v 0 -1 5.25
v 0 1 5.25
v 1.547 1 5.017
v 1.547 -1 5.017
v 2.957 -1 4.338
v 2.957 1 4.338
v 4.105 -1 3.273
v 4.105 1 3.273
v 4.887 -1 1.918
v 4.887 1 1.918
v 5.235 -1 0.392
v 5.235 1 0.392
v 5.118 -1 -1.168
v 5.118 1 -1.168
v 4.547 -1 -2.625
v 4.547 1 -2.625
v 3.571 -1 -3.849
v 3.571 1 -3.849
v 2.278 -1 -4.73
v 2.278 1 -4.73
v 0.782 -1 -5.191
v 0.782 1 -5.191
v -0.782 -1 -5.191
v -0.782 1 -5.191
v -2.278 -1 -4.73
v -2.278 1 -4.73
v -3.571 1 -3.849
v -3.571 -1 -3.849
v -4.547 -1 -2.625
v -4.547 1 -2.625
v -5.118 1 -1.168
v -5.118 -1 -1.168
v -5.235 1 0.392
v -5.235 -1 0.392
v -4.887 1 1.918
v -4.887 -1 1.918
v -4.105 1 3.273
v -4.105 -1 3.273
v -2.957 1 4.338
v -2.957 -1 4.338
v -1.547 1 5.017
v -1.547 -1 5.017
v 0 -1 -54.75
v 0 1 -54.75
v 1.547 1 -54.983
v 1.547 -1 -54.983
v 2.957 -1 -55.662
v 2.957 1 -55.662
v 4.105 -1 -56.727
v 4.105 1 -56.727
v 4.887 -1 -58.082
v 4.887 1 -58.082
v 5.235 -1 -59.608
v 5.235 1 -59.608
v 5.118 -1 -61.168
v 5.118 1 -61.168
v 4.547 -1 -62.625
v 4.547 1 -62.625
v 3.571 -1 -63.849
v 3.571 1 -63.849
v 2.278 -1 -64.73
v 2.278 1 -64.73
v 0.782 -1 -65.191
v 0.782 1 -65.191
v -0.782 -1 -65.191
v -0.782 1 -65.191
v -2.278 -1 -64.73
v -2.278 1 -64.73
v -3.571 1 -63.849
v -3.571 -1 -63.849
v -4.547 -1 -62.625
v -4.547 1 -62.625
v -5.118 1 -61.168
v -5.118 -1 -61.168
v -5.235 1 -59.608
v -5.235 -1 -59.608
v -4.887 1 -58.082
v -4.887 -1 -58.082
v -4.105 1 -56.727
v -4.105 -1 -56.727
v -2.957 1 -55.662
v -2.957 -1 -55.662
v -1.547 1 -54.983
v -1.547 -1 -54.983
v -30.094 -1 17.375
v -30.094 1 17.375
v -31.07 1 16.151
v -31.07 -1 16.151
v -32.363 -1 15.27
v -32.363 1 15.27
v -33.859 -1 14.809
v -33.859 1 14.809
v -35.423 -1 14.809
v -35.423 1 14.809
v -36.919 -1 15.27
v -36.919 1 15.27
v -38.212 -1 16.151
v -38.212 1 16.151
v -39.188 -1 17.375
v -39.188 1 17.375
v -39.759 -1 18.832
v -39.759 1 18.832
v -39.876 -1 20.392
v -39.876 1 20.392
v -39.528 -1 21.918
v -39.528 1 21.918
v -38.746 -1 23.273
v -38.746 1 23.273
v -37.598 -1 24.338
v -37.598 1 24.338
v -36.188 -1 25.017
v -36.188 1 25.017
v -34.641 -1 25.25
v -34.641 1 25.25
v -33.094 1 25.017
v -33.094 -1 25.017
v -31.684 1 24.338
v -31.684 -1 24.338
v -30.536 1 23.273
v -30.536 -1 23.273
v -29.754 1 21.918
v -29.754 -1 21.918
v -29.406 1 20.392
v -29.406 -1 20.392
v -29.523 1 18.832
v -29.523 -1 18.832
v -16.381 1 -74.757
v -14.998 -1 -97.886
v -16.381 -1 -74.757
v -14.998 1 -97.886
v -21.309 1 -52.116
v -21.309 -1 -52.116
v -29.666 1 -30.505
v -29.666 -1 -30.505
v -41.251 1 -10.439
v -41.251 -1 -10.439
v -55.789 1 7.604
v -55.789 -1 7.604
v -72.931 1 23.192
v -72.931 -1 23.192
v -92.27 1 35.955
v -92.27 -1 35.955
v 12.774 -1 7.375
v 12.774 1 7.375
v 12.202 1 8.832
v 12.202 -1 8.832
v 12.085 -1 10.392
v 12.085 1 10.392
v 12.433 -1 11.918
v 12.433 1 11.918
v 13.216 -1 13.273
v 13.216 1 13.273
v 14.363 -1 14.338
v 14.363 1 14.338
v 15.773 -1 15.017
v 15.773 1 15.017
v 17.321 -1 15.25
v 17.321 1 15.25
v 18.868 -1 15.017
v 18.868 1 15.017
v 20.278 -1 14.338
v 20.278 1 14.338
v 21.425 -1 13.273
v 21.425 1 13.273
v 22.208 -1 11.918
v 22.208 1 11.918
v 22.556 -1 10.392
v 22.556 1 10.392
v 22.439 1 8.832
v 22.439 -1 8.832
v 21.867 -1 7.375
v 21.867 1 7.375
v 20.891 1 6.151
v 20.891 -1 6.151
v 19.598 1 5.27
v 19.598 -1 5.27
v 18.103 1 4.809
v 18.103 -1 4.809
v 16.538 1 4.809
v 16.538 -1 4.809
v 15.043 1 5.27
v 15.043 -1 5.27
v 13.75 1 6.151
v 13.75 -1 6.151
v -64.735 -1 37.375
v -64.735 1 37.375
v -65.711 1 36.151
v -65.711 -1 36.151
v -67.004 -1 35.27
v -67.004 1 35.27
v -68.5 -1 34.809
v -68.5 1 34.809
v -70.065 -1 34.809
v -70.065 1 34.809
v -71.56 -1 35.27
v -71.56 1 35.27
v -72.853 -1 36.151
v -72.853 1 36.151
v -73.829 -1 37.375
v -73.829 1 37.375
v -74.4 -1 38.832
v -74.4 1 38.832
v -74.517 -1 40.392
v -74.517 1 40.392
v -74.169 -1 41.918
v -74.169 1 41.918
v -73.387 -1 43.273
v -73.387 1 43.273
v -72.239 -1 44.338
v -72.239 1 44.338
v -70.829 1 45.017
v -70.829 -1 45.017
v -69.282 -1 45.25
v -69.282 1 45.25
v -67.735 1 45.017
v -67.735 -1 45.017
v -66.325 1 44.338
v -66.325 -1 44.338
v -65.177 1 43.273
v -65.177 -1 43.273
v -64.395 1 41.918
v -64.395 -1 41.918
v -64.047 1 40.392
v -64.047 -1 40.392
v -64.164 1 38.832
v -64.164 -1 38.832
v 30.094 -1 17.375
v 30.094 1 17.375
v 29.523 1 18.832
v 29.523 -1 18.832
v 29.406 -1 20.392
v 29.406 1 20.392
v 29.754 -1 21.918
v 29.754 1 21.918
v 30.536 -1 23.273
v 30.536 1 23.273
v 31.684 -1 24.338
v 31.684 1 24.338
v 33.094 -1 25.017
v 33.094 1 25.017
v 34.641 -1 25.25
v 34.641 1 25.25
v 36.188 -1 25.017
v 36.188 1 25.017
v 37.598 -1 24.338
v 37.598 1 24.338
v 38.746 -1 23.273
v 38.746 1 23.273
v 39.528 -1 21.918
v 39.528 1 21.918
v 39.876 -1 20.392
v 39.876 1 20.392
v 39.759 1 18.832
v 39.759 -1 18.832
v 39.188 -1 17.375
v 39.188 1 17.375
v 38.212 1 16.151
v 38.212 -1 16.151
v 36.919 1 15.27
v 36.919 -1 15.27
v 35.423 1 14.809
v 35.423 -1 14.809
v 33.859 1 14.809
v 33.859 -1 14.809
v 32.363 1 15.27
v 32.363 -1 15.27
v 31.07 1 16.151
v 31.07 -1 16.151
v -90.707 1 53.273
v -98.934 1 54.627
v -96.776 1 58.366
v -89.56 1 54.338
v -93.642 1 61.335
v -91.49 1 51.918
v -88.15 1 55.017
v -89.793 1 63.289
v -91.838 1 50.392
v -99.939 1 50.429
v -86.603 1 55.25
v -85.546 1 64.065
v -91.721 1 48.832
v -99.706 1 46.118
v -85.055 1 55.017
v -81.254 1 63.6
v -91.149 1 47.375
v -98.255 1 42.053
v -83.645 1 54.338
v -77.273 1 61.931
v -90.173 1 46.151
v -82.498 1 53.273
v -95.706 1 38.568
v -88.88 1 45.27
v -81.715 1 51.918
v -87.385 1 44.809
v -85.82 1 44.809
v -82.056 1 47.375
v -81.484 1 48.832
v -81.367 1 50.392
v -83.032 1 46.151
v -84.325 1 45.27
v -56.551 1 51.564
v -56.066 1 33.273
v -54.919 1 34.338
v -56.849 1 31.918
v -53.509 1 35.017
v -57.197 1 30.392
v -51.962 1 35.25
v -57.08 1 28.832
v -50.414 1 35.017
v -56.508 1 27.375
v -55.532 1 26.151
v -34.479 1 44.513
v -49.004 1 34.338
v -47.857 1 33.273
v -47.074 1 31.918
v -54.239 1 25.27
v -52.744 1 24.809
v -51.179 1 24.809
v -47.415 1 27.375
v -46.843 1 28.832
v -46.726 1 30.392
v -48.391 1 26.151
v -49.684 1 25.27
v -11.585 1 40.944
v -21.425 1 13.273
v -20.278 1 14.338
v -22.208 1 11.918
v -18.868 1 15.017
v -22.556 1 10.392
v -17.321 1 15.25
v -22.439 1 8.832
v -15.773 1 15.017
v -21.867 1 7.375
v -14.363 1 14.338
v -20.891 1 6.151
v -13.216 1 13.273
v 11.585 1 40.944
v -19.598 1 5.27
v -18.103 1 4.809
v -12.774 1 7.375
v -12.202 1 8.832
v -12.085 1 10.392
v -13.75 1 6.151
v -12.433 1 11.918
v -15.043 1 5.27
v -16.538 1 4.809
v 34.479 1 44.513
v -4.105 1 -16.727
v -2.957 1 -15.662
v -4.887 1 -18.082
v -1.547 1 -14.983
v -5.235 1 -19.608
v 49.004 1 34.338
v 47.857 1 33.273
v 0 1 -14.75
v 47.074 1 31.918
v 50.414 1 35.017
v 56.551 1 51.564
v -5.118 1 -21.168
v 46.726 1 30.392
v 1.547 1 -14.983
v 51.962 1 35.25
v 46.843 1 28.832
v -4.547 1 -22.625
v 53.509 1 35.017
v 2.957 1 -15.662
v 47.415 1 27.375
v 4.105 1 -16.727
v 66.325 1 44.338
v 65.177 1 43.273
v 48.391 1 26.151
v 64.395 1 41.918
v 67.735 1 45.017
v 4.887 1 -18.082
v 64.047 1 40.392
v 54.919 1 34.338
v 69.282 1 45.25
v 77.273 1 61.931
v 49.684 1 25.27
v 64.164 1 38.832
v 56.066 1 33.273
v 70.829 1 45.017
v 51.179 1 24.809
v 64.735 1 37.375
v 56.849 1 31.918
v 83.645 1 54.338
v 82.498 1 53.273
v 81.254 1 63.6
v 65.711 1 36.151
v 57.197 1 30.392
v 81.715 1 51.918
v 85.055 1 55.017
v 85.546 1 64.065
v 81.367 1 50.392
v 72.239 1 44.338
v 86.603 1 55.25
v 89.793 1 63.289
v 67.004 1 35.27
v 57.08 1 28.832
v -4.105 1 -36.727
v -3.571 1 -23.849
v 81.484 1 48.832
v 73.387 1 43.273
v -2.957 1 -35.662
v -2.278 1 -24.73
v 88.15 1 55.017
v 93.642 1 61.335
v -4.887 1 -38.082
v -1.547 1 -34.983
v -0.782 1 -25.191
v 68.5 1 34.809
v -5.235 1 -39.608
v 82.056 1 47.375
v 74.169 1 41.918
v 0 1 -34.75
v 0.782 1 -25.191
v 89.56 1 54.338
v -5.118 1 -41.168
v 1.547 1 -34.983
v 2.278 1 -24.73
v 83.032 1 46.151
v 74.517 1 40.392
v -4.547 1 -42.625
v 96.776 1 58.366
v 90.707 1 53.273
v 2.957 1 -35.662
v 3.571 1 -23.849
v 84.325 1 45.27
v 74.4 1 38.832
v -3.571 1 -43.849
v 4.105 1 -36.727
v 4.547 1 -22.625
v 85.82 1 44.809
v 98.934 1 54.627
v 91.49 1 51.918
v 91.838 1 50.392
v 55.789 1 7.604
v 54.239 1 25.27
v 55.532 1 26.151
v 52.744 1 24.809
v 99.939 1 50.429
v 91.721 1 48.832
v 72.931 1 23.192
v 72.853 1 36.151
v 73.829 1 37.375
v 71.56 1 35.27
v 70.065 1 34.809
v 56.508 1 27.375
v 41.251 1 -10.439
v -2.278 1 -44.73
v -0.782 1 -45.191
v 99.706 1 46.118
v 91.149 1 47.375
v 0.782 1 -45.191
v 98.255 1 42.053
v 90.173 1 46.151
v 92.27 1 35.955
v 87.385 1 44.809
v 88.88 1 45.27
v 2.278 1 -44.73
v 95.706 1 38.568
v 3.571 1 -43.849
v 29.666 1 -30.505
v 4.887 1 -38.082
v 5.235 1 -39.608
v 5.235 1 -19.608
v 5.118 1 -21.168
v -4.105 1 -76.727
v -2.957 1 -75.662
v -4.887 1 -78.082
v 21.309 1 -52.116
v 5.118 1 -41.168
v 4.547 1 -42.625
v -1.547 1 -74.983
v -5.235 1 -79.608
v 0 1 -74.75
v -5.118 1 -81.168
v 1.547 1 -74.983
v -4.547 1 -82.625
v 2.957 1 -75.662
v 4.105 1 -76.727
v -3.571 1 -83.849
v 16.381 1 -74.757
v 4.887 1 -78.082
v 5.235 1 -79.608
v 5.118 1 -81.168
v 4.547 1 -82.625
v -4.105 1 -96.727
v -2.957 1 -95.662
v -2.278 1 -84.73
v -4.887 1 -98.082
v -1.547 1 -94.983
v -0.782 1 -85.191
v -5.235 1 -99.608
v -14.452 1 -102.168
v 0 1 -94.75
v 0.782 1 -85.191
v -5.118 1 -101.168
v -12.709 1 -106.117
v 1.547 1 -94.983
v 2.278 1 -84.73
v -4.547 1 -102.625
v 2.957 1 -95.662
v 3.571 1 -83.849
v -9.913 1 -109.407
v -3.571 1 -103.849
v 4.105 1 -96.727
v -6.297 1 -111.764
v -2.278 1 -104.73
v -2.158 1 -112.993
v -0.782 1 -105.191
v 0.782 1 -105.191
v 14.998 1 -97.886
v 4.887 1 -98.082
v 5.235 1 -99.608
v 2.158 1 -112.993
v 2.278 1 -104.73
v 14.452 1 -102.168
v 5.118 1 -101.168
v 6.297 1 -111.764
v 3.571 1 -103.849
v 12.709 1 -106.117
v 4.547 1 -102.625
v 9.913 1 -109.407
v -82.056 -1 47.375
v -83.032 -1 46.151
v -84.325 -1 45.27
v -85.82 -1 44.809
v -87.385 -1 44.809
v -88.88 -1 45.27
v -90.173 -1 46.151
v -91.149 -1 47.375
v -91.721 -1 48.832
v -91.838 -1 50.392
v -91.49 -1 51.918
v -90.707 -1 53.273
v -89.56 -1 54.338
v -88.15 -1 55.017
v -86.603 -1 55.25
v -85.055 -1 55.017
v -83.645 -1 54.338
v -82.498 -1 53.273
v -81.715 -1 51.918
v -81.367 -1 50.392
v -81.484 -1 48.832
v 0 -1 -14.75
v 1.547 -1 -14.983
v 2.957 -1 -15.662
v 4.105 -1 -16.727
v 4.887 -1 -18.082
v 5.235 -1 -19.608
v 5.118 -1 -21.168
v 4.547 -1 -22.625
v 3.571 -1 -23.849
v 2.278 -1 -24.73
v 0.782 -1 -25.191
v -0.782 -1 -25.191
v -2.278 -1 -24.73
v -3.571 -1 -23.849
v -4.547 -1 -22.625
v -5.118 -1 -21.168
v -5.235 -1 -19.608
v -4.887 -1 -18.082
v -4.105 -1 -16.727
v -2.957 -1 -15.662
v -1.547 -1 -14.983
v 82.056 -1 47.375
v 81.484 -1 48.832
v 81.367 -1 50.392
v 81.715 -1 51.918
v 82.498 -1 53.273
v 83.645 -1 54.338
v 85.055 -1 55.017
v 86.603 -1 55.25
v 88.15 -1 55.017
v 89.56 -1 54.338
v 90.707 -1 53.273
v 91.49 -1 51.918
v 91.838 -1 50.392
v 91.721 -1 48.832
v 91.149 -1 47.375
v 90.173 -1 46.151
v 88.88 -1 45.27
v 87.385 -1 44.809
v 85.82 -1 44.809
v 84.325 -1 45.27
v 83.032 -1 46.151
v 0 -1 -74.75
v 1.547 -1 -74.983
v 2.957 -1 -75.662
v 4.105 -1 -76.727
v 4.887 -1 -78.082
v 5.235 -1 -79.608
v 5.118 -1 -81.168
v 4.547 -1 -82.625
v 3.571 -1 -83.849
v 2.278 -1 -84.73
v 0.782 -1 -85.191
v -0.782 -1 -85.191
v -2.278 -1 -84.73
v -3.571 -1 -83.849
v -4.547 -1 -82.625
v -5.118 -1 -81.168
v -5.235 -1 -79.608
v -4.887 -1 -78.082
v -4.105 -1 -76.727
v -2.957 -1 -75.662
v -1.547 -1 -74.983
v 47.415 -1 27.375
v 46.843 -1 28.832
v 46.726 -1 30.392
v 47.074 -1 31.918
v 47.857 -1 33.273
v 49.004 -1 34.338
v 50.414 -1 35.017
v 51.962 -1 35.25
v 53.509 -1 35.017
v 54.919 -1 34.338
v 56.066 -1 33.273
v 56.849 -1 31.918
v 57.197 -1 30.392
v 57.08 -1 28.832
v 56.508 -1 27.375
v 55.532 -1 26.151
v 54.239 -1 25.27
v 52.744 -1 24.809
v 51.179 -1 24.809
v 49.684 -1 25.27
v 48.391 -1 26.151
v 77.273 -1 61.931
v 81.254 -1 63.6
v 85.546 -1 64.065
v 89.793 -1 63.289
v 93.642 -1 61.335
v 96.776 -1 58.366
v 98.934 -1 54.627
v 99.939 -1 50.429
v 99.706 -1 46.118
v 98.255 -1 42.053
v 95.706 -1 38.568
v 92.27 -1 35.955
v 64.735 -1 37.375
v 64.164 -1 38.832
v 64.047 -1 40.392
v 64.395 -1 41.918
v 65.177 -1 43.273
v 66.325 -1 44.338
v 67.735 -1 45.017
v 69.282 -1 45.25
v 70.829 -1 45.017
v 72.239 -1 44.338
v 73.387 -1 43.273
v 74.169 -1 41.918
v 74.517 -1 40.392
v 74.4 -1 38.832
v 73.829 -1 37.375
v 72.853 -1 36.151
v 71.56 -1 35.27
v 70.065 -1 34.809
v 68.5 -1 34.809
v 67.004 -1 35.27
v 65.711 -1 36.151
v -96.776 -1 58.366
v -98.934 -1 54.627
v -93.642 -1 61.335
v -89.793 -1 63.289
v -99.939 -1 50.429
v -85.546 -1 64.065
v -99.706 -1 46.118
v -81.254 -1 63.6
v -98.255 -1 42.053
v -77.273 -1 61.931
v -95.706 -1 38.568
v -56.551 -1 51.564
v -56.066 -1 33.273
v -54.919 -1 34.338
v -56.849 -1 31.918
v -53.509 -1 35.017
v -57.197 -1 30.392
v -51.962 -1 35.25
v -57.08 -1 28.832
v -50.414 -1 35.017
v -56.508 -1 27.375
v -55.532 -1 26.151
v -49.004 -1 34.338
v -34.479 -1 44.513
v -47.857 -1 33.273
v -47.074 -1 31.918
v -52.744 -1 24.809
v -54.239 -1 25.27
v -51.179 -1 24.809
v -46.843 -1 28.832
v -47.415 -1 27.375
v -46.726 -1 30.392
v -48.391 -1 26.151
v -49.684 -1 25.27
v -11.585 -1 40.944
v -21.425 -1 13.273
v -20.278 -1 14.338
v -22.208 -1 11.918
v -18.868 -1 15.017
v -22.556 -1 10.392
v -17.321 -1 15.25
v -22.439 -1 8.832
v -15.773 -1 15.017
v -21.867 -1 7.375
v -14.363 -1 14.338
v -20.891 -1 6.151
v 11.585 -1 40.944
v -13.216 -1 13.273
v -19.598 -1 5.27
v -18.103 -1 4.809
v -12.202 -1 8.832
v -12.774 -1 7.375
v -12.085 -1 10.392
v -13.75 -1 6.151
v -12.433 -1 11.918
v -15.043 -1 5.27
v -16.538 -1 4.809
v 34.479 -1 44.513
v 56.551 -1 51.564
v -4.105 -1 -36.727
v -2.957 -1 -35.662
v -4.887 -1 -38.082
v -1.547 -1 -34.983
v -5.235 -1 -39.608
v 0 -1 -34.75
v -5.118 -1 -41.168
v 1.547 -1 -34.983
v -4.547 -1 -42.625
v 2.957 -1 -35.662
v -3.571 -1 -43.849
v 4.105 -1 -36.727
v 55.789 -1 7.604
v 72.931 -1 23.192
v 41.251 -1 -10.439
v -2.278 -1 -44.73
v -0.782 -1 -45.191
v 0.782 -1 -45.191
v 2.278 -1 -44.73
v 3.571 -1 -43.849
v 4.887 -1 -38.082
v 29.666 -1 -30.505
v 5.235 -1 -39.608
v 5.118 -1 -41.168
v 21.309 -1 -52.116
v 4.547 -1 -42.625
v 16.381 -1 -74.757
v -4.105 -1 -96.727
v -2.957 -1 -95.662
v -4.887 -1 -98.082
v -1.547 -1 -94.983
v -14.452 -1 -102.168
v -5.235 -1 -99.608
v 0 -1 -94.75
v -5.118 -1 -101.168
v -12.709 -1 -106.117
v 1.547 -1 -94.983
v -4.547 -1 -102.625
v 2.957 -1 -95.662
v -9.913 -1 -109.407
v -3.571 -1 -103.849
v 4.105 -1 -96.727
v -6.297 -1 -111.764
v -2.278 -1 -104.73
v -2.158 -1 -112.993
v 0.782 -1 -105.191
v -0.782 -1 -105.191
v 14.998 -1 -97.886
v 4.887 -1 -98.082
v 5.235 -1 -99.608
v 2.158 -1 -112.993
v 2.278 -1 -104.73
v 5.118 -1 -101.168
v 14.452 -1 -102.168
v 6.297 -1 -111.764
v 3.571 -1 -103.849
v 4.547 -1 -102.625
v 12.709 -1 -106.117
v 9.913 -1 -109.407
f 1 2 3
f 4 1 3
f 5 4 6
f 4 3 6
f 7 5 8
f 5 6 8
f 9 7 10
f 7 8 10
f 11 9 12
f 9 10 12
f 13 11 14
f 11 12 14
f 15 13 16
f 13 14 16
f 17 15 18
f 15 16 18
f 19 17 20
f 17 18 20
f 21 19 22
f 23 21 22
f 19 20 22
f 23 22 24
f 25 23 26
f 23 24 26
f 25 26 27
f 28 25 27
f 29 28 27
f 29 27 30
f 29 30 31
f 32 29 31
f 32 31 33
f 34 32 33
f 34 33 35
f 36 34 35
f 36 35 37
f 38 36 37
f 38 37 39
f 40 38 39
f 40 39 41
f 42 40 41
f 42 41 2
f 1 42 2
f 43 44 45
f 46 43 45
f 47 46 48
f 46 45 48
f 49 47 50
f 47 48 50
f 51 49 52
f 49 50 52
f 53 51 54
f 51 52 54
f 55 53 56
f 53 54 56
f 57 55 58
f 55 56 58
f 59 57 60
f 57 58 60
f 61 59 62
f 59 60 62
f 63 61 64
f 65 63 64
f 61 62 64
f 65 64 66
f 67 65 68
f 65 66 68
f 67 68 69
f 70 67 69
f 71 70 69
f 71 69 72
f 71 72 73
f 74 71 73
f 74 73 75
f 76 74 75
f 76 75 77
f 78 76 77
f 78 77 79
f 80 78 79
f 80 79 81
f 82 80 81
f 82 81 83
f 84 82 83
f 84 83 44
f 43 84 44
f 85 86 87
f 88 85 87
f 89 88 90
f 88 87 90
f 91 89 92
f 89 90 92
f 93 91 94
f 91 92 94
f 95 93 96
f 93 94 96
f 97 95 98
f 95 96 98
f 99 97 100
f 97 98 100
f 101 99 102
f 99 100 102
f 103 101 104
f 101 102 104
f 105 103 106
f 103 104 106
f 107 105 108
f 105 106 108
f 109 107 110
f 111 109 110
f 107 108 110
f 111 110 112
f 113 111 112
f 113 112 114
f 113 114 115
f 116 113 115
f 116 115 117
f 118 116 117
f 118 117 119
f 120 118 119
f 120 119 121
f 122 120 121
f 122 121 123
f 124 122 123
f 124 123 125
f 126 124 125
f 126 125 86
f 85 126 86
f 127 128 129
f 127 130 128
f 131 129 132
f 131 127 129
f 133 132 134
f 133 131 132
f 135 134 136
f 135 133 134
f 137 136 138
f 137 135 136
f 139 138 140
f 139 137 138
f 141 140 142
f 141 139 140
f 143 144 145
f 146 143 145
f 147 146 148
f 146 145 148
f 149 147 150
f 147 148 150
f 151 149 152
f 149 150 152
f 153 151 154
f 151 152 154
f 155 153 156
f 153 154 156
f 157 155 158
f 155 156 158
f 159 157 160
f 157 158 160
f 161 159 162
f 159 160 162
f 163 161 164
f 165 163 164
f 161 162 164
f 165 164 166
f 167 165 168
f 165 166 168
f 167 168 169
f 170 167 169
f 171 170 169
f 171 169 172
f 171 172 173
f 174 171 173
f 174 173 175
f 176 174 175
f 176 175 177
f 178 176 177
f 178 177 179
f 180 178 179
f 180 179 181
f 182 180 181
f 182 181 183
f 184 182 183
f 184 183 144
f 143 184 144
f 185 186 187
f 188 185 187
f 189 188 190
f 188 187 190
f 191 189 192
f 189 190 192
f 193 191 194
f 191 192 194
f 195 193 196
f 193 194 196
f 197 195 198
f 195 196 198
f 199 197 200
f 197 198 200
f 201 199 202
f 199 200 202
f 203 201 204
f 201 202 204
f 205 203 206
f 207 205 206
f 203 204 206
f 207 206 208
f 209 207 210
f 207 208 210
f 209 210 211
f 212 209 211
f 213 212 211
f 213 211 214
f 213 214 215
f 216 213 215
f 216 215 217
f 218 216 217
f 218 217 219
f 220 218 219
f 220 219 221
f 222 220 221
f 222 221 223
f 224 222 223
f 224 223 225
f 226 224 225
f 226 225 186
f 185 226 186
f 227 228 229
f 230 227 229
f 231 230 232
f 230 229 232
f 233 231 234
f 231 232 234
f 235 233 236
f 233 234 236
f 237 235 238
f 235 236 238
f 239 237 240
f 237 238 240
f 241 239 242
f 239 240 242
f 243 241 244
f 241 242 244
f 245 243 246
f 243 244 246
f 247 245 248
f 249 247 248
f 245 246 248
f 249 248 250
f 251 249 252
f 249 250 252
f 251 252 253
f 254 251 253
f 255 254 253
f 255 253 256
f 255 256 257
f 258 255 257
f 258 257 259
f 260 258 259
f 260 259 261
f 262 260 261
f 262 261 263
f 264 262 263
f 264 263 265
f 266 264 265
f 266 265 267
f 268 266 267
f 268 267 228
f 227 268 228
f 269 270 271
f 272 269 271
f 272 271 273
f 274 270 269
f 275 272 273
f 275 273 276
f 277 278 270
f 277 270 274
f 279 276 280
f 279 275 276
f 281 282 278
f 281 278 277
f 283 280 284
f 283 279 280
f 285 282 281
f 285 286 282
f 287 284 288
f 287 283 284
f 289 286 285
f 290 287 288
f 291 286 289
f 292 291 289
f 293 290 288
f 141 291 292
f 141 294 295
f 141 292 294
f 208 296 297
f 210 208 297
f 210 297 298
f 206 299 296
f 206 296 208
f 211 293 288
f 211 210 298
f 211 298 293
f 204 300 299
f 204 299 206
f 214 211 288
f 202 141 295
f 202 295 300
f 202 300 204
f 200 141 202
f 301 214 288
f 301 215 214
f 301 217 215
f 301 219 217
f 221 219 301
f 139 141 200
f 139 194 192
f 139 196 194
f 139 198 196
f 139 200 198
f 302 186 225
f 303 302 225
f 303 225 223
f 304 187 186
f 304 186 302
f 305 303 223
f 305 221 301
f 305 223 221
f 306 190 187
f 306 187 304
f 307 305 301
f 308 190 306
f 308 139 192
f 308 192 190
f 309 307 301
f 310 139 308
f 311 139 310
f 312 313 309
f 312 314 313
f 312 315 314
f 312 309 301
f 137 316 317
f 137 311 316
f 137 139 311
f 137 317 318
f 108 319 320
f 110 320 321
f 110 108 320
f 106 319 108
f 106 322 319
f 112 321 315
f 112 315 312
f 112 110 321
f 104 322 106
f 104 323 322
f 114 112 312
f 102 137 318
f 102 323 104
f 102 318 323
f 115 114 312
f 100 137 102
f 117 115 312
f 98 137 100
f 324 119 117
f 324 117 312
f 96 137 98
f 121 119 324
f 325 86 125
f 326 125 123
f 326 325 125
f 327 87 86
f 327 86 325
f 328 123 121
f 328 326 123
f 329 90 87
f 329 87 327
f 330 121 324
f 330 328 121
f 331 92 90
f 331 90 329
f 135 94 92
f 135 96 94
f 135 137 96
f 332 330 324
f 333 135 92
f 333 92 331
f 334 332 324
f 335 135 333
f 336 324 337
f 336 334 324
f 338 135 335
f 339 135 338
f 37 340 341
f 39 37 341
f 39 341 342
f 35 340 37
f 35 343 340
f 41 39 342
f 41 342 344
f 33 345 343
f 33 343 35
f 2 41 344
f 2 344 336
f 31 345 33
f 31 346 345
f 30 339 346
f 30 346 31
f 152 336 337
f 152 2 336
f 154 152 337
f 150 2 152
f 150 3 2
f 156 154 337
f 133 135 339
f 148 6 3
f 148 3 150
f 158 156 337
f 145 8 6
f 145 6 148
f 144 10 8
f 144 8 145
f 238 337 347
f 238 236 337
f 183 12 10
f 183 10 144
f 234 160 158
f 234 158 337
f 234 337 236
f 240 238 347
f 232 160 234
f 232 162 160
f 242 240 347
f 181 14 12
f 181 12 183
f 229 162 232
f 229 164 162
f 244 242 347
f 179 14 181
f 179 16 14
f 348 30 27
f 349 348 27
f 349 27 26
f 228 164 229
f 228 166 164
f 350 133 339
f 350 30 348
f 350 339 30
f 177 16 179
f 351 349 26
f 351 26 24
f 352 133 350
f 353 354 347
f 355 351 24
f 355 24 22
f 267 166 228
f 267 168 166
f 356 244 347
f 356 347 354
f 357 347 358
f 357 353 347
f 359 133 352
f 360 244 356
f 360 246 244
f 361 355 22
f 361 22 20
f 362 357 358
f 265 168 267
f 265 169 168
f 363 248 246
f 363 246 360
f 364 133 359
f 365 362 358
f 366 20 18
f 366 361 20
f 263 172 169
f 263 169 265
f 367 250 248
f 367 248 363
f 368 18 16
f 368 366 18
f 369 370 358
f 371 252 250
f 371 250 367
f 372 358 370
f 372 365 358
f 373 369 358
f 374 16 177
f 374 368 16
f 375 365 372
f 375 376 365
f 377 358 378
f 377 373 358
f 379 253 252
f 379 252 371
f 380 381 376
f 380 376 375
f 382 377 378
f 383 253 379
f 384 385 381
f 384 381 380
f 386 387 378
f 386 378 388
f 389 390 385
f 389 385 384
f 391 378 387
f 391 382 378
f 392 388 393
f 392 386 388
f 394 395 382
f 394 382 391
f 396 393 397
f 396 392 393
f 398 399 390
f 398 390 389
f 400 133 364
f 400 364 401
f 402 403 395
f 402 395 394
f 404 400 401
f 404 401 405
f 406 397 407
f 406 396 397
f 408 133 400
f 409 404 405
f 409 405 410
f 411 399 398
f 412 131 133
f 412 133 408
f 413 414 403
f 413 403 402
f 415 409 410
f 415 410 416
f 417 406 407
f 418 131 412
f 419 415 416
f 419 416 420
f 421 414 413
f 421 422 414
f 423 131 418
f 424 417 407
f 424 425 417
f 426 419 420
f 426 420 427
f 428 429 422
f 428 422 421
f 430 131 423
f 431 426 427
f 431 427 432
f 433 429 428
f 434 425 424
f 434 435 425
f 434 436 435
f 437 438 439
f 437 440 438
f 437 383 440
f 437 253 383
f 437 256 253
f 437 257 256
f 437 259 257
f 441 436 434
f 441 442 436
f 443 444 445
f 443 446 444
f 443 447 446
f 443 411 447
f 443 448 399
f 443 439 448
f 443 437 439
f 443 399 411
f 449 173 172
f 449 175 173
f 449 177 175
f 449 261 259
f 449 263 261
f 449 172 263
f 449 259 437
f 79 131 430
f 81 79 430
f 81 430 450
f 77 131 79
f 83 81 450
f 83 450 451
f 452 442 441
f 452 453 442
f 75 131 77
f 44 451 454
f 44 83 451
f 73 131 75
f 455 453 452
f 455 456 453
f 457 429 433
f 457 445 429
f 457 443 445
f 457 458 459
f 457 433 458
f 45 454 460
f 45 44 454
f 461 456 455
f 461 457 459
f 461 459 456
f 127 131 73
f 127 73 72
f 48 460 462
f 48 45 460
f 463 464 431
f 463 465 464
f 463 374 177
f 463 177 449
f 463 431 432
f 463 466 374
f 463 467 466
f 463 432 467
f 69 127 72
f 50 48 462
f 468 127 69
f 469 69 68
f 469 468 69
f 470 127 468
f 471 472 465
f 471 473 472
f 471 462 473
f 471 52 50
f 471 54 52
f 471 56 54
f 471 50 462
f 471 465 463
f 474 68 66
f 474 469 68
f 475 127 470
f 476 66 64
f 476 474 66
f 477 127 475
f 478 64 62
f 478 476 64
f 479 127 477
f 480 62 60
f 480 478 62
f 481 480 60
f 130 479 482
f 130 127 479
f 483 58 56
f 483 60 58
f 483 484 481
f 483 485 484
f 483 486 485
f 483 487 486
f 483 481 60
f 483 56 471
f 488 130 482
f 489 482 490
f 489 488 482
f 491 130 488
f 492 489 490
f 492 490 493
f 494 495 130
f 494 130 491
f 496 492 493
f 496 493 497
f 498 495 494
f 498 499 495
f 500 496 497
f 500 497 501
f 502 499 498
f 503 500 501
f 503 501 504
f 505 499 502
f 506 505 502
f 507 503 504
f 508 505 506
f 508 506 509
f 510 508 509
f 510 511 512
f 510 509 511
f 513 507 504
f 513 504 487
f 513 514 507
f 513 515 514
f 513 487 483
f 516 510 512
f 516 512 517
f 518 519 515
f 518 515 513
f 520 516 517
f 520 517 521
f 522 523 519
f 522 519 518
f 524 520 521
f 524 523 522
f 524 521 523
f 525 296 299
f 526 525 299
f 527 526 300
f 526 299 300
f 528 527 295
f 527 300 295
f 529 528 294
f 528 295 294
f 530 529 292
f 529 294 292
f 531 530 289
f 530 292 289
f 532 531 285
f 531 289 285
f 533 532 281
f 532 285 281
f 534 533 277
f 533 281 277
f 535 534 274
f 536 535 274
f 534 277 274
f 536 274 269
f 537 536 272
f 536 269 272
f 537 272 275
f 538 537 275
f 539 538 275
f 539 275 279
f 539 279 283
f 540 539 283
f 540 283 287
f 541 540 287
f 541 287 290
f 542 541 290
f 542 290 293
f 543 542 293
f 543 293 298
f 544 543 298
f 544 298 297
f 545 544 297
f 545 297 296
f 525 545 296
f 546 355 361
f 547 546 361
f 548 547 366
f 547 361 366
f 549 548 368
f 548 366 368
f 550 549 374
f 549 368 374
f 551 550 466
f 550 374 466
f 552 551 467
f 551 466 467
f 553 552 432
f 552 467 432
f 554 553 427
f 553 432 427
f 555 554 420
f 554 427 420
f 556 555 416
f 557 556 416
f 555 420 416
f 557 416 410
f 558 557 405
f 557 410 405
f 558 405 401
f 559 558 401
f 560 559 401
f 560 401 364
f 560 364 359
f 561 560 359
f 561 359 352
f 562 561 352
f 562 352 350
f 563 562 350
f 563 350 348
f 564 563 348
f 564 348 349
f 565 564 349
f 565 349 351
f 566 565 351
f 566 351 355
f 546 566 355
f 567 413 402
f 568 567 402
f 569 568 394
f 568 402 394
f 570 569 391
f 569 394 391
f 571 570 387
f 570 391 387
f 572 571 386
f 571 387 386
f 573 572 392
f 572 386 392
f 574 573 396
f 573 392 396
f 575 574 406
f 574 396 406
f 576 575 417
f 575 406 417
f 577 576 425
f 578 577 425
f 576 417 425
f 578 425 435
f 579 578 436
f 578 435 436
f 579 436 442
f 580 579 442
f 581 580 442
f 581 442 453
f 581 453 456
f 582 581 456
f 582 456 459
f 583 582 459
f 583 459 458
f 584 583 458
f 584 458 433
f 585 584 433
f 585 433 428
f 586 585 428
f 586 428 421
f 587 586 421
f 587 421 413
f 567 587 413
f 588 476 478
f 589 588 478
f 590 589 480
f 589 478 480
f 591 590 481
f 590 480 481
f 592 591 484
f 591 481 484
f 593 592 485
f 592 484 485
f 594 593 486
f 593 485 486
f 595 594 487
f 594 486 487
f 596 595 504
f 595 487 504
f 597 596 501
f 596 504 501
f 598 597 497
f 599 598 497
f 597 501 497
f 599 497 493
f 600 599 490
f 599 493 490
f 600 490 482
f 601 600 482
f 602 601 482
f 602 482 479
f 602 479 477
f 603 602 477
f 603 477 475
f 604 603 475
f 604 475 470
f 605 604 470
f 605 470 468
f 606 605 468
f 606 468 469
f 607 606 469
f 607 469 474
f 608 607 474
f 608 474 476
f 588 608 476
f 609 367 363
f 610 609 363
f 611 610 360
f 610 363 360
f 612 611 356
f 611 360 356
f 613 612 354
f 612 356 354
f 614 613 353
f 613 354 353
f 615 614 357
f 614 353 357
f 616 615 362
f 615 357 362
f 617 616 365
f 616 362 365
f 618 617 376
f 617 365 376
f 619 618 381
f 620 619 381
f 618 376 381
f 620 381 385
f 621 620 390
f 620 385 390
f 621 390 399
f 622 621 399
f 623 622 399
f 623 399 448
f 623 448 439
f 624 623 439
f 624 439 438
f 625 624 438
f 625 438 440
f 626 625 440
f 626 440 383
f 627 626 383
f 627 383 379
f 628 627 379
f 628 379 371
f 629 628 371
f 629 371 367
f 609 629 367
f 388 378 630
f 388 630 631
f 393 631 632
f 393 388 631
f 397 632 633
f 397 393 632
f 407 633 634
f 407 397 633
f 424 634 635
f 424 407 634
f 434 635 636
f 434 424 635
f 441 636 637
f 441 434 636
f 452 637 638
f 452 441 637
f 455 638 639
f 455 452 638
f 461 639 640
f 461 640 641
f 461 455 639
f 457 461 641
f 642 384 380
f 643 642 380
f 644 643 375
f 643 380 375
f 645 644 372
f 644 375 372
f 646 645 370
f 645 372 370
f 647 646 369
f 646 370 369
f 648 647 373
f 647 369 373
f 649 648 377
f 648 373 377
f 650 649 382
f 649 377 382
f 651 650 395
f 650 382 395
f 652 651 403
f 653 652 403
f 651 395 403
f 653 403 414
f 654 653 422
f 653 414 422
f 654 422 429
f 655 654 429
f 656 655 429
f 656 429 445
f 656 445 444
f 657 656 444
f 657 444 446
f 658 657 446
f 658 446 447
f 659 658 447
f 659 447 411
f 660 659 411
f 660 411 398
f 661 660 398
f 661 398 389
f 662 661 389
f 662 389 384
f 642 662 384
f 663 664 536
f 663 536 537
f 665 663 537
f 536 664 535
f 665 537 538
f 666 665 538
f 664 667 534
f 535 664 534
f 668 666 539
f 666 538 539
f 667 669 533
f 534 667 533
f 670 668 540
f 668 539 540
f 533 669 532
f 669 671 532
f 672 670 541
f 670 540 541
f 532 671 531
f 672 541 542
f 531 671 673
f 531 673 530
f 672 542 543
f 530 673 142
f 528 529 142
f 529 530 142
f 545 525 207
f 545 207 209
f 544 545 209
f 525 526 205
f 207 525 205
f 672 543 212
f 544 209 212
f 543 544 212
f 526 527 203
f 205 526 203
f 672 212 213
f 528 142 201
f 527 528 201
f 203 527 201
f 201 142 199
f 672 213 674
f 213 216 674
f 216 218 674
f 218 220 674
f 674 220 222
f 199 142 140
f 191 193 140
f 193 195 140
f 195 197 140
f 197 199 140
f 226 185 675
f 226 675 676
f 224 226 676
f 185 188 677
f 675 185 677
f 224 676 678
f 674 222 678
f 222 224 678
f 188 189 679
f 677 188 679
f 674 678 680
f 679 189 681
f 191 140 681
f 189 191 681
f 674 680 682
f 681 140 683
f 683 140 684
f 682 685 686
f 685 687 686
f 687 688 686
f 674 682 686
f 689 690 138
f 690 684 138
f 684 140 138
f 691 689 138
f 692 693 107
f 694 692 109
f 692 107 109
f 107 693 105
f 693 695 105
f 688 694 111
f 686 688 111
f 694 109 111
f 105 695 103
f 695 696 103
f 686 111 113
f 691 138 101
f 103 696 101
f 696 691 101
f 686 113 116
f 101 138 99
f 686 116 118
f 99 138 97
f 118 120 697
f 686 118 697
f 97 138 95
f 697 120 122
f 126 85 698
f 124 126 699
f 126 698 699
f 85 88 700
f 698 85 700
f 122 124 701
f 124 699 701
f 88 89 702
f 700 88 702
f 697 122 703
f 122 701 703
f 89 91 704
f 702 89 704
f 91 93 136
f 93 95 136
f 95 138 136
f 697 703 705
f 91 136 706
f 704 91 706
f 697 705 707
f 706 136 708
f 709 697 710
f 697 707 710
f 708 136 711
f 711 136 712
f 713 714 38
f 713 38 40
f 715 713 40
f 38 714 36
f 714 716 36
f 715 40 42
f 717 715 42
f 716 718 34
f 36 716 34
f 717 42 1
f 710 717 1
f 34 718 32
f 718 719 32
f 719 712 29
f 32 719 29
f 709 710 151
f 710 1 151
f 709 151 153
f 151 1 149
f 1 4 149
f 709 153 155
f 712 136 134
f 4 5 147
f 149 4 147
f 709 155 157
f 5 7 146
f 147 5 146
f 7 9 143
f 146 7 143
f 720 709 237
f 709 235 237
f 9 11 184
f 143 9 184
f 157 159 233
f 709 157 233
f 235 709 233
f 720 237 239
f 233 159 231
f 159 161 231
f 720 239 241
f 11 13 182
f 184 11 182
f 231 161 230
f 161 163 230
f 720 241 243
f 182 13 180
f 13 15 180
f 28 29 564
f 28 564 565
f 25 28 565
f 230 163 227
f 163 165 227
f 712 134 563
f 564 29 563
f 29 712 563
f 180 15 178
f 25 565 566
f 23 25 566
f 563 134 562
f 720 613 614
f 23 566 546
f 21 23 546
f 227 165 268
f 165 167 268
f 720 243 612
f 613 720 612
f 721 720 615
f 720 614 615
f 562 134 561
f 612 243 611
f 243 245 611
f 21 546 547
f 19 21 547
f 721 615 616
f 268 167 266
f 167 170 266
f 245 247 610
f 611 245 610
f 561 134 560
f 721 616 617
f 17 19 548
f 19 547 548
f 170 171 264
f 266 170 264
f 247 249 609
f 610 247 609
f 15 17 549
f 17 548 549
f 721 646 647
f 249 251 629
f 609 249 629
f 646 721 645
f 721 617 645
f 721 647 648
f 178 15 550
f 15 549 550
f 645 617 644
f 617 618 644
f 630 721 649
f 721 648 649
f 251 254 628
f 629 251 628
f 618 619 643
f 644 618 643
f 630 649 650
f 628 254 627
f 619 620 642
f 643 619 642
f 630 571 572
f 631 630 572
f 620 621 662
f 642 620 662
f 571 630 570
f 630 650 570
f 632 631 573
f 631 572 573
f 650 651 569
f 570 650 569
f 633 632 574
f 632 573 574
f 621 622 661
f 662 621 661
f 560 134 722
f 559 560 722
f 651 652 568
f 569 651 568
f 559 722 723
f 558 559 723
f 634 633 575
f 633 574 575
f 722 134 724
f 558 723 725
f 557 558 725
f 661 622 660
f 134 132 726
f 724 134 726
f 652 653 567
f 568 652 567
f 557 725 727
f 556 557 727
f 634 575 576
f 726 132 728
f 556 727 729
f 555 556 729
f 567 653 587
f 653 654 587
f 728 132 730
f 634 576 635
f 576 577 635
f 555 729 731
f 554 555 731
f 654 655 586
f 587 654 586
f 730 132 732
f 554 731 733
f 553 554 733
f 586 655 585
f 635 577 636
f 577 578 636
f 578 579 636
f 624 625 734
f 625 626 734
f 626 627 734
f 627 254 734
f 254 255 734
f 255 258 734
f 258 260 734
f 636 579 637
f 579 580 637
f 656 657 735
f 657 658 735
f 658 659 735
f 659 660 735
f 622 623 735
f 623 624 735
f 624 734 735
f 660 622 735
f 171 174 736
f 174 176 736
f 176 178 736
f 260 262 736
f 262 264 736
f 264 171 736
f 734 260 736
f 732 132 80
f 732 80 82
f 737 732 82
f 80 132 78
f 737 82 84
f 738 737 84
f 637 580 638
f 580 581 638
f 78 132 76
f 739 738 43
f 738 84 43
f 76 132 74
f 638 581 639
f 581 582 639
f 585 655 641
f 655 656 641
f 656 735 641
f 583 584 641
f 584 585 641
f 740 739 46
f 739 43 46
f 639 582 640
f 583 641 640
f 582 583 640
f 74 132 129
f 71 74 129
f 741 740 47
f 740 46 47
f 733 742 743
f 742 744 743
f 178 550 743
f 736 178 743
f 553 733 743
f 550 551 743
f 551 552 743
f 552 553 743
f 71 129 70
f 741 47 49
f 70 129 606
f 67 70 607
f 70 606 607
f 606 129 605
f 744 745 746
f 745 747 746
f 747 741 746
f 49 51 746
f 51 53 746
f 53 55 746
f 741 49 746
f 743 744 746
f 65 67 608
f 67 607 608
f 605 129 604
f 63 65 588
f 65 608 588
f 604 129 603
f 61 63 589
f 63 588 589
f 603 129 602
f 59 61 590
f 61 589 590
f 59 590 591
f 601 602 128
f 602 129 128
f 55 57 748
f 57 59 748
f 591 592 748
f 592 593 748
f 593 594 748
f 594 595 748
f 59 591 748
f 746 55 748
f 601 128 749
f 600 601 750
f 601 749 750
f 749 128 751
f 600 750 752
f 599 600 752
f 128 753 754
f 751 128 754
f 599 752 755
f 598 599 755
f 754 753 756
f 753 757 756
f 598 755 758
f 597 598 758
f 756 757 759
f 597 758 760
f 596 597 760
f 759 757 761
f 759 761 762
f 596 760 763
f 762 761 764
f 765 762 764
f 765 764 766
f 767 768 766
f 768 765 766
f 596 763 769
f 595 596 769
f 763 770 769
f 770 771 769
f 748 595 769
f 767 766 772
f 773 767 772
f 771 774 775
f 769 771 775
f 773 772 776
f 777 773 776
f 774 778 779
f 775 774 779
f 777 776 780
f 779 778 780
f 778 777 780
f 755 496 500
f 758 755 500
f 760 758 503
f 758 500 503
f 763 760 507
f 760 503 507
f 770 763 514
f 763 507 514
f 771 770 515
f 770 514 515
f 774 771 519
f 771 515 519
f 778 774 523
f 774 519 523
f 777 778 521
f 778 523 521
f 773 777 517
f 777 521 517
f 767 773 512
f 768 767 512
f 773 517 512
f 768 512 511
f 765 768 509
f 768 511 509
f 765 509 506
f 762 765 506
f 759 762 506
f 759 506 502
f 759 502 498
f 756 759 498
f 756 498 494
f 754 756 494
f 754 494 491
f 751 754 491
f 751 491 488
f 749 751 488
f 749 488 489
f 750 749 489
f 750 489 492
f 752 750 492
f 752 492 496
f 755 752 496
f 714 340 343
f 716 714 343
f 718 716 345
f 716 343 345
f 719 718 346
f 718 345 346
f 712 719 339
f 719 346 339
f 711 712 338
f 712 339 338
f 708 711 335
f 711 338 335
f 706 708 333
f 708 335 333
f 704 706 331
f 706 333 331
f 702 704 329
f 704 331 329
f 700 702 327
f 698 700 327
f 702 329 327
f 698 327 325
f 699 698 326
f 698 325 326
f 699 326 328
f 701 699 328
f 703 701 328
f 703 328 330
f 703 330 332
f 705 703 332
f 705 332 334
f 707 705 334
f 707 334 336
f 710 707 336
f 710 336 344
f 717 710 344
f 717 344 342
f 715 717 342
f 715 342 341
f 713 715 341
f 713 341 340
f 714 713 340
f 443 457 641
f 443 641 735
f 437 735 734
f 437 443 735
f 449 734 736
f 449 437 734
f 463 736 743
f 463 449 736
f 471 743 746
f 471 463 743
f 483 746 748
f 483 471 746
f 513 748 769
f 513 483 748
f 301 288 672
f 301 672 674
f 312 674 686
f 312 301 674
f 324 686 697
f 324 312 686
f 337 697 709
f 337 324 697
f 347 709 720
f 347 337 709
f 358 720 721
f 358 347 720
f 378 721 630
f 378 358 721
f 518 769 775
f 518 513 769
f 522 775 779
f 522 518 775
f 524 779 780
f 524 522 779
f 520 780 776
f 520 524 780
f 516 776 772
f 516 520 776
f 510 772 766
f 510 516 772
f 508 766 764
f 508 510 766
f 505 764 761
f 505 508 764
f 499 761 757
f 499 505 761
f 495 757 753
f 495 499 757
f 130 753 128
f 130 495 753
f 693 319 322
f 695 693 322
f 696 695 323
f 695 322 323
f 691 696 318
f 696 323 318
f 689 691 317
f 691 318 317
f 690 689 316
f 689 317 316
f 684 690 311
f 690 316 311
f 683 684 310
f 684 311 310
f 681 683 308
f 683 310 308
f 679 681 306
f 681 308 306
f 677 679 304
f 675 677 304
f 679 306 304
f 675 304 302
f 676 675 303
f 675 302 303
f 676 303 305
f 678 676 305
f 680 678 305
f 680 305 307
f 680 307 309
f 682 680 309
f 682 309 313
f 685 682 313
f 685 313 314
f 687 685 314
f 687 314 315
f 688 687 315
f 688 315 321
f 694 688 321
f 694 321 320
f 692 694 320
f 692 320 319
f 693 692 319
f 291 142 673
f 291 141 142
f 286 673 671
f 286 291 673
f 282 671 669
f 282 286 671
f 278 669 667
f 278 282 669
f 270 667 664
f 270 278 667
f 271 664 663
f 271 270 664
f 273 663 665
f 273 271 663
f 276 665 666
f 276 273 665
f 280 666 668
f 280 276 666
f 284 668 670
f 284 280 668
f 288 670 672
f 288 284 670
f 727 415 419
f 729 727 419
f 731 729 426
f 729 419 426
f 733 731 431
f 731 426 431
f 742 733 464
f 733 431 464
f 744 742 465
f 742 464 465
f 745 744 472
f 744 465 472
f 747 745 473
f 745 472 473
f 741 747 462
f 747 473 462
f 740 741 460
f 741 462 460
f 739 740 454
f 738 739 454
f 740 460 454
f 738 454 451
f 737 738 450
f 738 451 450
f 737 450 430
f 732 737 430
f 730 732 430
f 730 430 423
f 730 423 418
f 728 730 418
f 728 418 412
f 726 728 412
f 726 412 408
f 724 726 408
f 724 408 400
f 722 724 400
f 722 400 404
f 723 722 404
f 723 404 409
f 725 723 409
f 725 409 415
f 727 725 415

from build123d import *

# Parameters (mm, degrees)
BOSS_EXTRUDE1_DEPTH          = 1
CUT_EXTRUDE1_REACH           = 153.019
SKETCH2_R                    = 5.25
LPATTERN1_COUNT              = 6
LPATTERN1_PITCH              = 20
CIRPATTERN1_COPY_1_REACH     = 153.019
CIRPATTERN1_COPY_1_SKETCH_R  = 5.25
CIRPATTERN1_COPY_2_REACH     = 153.019
CIRPATTERN1_COPY_2_SKETCH_R  = 5.25
CIRPATTERN1_COPY_3_REACH     = 153.019
CIRPATTERN1_COPY_3_SKETCH_R  = 5.25
CIRPATTERN1_COPY_4_REACH     = 153.019
CIRPATTERN1_COPY_4_SKETCH_R  = 5.25
CIRPATTERN1_COPY_5_REACH     = 153.019
CIRPATTERN1_COPY_5_SKETCH_R  = 5.25
CIRPATTERN1_COPY_6_REACH     = 153.019
CIRPATTERN1_COPY_6_SKETCH_R  = 5.25
CIRPATTERN1_COPY_7_REACH     = 153.019
CIRPATTERN1_COPY_7_SKETCH_R  = 5.25
CIRPATTERN1_COPY_8_REACH     = 153.019
CIRPATTERN1_COPY_8_SKETCH_R  = 5.25
CIRPATTERN1_COPY_9_REACH     = 153.019
CIRPATTERN1_COPY_9_SKETCH_R  = 5.25
CIRPATTERN1_COPY_10_REACH    = 153.019
CIRPATTERN1_COPY_10_SKETCH_R = 5.25


with BuildPart() as part:
    # Sketch1 → Boss-Extrude1 (new, symmetric)
    with BuildSketch(Plane(origin=(0, 0, 0), x_dir=(1, 0, 0), z_dir=(0, 1, 0))):
        with BuildLine():
            ThreePointArc((-92.270407539, -35.95451472), (-97.990380878, -56.574773191), (-77.272726285, -61.931259218))
            ThreePointArc((-77.272726285, -61.931259218), (-7.65e-07, -40.496129118), (77.272724973, -61.931258429))
            ThreePointArc((77.272724973, -61.931258429), (97.990379986, -56.574774736), (92.270409321, -35.954515707))
            ThreePointArc((92.270409321, -35.954515707), (35.070677387, 20.248063146), (14.99768062, 97.88577308))
            ThreePointArc((14.99768062, 97.88577308), (9.1e-08, 113.149545762), (-14.997680623, 97.885773262))
            ThreePointArc((-14.997680623, 97.885773262), (-35.070676832, 20.248064107), (-92.270407539, -35.95451472))
        make_face()
    extrude(amount=BOSS_EXTRUDE1_DEPTH, both=True)

    # Sketch2 → Cut-Extrude1 (cut, up to next)
    with BuildSketch(Plane(origin=(0, 1, 0), x_dir=(1, 0, 0), z_dir=(0, 1, 0)), mode=Mode.PRIVATE) as cut_extrude1_sk1:
        with Locations(Location((0, 0, 0), (0, 0, 270))):
            Circle(SKETCH2_R)
    cut_extrude1_tool1 = extrude(cut_extrude1_sk1.sketch, amount=-CUT_EXTRUDE1_REACH, mode=Mode.PRIVATE) & part.part
    cut_extrude1 = cut_extrude1_tool1.solids().sort_by_distance((0, 1, 0))[0]
    add(cut_extrude1, mode=Mode.SUBTRACT)

    # LPattern1: Cut-Extrude1 ×6
    with Locations(*[(0, 0, -i * LPATTERN1_PITCH) for i in range(1, LPATTERN1_COUNT)]):
        add(cut_extrude1, mode=Mode.SUBTRACT)

    # CirPattern1 copy 1 sketch → CirPattern1 copy 1 (cut, up to next)
    with BuildSketch(Plane(origin=(-17.320508076, 1, 10), x_dir=(-0.4999999999999998, 0, -0.8660254037844387), z_dir=(0, 1, 0)), mode=Mode.PRIVATE) as cirpattern1_copy_1_sk1:
        with Locations(Location((0, 0, 0), (0, 0, 270))):
            Circle(CIRPATTERN1_COPY_1_SKETCH_R)
    cirpattern1_copy_1_tool1 = extrude(cirpattern1_copy_1_sk1.sketch, amount=-CIRPATTERN1_COPY_1_REACH, mode=Mode.PRIVATE) & part.part
    add(cirpattern1_copy_1_tool1.solids().sort_by_distance((-17.320508076, 1, 10))[0], mode=Mode.SUBTRACT)

    # CirPattern1 copy 2 sketch → CirPattern1 copy 2 (cut, up to next)
    with BuildSketch(Plane(origin=(17.320508076, 1, 10), x_dir=(-0.5000000000000004, 0, 0.8660254037844384), z_dir=(0, 1, 0)), mode=Mode.PRIVATE) as cirpattern1_copy_2_sk1:
        with Locations(Location((0, 0, 0), (0, 0, 270))):
            Circle(CIRPATTERN1_COPY_2_SKETCH_R)
    cirpattern1_copy_2_tool1 = extrude(cirpattern1_copy_2_sk1.sketch, amount=-CIRPATTERN1_COPY_2_REACH, mode=Mode.PRIVATE) & part.part
    add(cirpattern1_copy_2_tool1.solids().sort_by_distance((17.320508076, 1, 10))[0], mode=Mode.SUBTRACT)

    # CirPattern1 copy 3 sketch → CirPattern1 copy 3 (cut, up to next)
    with BuildSketch(Plane(origin=(-34.641016151, 1, 20), x_dir=(-0.4999999999999998, 0, -0.8660254037844387), z_dir=(0, 1, 0)), mode=Mode.PRIVATE) as cirpattern1_copy_3_sk1:
        with Locations(Location((0, 0, 0), (0, 0, 270))):
            Circle(CIRPATTERN1_COPY_3_SKETCH_R)
    cirpattern1_copy_3_tool1 = extrude(cirpattern1_copy_3_sk1.sketch, amount=-CIRPATTERN1_COPY_3_REACH, mode=Mode.PRIVATE) & part.part
    add(cirpattern1_copy_3_tool1.solids().sort_by_distance((-34.641016151, 1, 20))[0], mode=Mode.SUBTRACT)

    # CirPattern1 copy 4 sketch → CirPattern1 copy 4 (cut, up to next)
    with BuildSketch(Plane(origin=(34.641016151, 1, 20), x_dir=(-0.5000000000000004, 0, 0.8660254037844384), z_dir=(0, 1, 0)), mode=Mode.PRIVATE) as cirpattern1_copy_4_sk1:
        with Locations(Location((0, 0, 0), (0, 0, 270))):
            Circle(CIRPATTERN1_COPY_4_SKETCH_R)
    cirpattern1_copy_4_tool1 = extrude(cirpattern1_copy_4_sk1.sketch, amount=-CIRPATTERN1_COPY_4_REACH, mode=Mode.PRIVATE) & part.part
    add(cirpattern1_copy_4_tool1.solids().sort_by_distance((34.641016151, 1, 20))[0], mode=Mode.SUBTRACT)

    # CirPattern1 copy 5 sketch → CirPattern1 copy 5 (cut, up to next)
    with BuildSketch(Plane(origin=(-51.961524227, 1, 30), x_dir=(-0.4999999999999998, 0, -0.8660254037844387), z_dir=(0, 1, 0)), mode=Mode.PRIVATE) as cirpattern1_copy_5_sk1:
        with Locations(Location((0, 0, 0), (0, 0, 270))):
            Circle(CIRPATTERN1_COPY_5_SKETCH_R)
    cirpattern1_copy_5_tool1 = extrude(cirpattern1_copy_5_sk1.sketch, amount=-CIRPATTERN1_COPY_5_REACH, mode=Mode.PRIVATE) & part.part
    add(cirpattern1_copy_5_tool1.solids().sort_by_distance((-51.961524227, 1, 30))[0], mode=Mode.SUBTRACT)

    # CirPattern1 copy 6 sketch → CirPattern1 copy 6 (cut, up to next)
    with BuildSketch(Plane(origin=(51.961524227, 1, 30), x_dir=(-0.5000000000000004, 0, 0.8660254037844384), z_dir=(0, 1, 0)), mode=Mode.PRIVATE) as cirpattern1_copy_6_sk1:
        with Locations(Location((0, 0, 0), (0, 0, 270))):
            Circle(CIRPATTERN1_COPY_6_SKETCH_R)
    cirpattern1_copy_6_tool1 = extrude(cirpattern1_copy_6_sk1.sketch, amount=-CIRPATTERN1_COPY_6_REACH, mode=Mode.PRIVATE) & part.part
    add(cirpattern1_copy_6_tool1.solids().sort_by_distance((51.961524227, 1, 30))[0], mode=Mode.SUBTRACT)

    # CirPattern1 copy 7 sketch → CirPattern1 copy 7 (cut, up to next)
    with BuildSketch(Plane(origin=(-69.282032303, 1, 40), x_dir=(-0.4999999999999998, 0, -0.8660254037844387), z_dir=(0, 1, 0)), mode=Mode.PRIVATE) as cirpattern1_copy_7_sk1:
        with Locations(Location((0, 0, 0), (0, 0, 270))):
            Circle(CIRPATTERN1_COPY_7_SKETCH_R)
    cirpattern1_copy_7_tool1 = extrude(cirpattern1_copy_7_sk1.sketch, amount=-CIRPATTERN1_COPY_7_REACH, mode=Mode.PRIVATE) & part.part
    add(cirpattern1_copy_7_tool1.solids().sort_by_distance((-69.282032303, 1, 40))[0], mode=Mode.SUBTRACT)

    # CirPattern1 copy 8 sketch → CirPattern1 copy 8 (cut, up to next)
    with BuildSketch(Plane(origin=(69.282032303, 1, 40), x_dir=(-0.5000000000000004, 0, 0.8660254037844384), z_dir=(0, 1, 0)), mode=Mode.PRIVATE) as cirpattern1_copy_8_sk1:
        with Locations(Location((0, 0, 0), (0, 0, 270))):
            Circle(CIRPATTERN1_COPY_8_SKETCH_R)
    cirpattern1_copy_8_tool1 = extrude(cirpattern1_copy_8_sk1.sketch, amount=-CIRPATTERN1_COPY_8_REACH, mode=Mode.PRIVATE) & part.part
    add(cirpattern1_copy_8_tool1.solids().sort_by_distance((69.282032303, 1, 40))[0], mode=Mode.SUBTRACT)

    # CirPattern1 copy 9 sketch → CirPattern1 copy 9 (cut, up to next)
    with BuildSketch(Plane(origin=(-86.602540378, 1, 50), x_dir=(-0.4999999999999998, 0, -0.8660254037844387), z_dir=(0, 1, 0)), mode=Mode.PRIVATE) as cirpattern1_copy_9_sk1:
        with Locations(Location((0, 0, 0), (0, 0, 270))):
            Circle(CIRPATTERN1_COPY_9_SKETCH_R)
    cirpattern1_copy_9_tool1 = extrude(cirpattern1_copy_9_sk1.sketch, amount=-CIRPATTERN1_COPY_9_REACH, mode=Mode.PRIVATE) & part.part
    add(cirpattern1_copy_9_tool1.solids().sort_by_distance((-86.602540378, 1, 50))[0], mode=Mode.SUBTRACT)

    # CirPattern1 copy 10 sketch → CirPattern1 copy 10 (cut, up to next)
    with BuildSketch(Plane(origin=(86.602540378, 1, 50), x_dir=(-0.5000000000000004, 0, 0.8660254037844384), z_dir=(0, 1, 0)), mode=Mode.PRIVATE) as cirpattern1_copy_10_sk1:
        with Locations(Location((0, 0, 0), (0, 0, 270))):
            Circle(CIRPATTERN1_COPY_10_SKETCH_R)
    cirpattern1_copy_10_tool1 = extrude(cirpattern1_copy_10_sk1.sketch, amount=-CIRPATTERN1_COPY_10_REACH, mode=Mode.PRIVATE) & part.part
    add(cirpattern1_copy_10_tool1.solids().sort_by_distance((86.602540378, 1, 50))[0], mode=Mode.SUBTRACT)


solid = part.part
